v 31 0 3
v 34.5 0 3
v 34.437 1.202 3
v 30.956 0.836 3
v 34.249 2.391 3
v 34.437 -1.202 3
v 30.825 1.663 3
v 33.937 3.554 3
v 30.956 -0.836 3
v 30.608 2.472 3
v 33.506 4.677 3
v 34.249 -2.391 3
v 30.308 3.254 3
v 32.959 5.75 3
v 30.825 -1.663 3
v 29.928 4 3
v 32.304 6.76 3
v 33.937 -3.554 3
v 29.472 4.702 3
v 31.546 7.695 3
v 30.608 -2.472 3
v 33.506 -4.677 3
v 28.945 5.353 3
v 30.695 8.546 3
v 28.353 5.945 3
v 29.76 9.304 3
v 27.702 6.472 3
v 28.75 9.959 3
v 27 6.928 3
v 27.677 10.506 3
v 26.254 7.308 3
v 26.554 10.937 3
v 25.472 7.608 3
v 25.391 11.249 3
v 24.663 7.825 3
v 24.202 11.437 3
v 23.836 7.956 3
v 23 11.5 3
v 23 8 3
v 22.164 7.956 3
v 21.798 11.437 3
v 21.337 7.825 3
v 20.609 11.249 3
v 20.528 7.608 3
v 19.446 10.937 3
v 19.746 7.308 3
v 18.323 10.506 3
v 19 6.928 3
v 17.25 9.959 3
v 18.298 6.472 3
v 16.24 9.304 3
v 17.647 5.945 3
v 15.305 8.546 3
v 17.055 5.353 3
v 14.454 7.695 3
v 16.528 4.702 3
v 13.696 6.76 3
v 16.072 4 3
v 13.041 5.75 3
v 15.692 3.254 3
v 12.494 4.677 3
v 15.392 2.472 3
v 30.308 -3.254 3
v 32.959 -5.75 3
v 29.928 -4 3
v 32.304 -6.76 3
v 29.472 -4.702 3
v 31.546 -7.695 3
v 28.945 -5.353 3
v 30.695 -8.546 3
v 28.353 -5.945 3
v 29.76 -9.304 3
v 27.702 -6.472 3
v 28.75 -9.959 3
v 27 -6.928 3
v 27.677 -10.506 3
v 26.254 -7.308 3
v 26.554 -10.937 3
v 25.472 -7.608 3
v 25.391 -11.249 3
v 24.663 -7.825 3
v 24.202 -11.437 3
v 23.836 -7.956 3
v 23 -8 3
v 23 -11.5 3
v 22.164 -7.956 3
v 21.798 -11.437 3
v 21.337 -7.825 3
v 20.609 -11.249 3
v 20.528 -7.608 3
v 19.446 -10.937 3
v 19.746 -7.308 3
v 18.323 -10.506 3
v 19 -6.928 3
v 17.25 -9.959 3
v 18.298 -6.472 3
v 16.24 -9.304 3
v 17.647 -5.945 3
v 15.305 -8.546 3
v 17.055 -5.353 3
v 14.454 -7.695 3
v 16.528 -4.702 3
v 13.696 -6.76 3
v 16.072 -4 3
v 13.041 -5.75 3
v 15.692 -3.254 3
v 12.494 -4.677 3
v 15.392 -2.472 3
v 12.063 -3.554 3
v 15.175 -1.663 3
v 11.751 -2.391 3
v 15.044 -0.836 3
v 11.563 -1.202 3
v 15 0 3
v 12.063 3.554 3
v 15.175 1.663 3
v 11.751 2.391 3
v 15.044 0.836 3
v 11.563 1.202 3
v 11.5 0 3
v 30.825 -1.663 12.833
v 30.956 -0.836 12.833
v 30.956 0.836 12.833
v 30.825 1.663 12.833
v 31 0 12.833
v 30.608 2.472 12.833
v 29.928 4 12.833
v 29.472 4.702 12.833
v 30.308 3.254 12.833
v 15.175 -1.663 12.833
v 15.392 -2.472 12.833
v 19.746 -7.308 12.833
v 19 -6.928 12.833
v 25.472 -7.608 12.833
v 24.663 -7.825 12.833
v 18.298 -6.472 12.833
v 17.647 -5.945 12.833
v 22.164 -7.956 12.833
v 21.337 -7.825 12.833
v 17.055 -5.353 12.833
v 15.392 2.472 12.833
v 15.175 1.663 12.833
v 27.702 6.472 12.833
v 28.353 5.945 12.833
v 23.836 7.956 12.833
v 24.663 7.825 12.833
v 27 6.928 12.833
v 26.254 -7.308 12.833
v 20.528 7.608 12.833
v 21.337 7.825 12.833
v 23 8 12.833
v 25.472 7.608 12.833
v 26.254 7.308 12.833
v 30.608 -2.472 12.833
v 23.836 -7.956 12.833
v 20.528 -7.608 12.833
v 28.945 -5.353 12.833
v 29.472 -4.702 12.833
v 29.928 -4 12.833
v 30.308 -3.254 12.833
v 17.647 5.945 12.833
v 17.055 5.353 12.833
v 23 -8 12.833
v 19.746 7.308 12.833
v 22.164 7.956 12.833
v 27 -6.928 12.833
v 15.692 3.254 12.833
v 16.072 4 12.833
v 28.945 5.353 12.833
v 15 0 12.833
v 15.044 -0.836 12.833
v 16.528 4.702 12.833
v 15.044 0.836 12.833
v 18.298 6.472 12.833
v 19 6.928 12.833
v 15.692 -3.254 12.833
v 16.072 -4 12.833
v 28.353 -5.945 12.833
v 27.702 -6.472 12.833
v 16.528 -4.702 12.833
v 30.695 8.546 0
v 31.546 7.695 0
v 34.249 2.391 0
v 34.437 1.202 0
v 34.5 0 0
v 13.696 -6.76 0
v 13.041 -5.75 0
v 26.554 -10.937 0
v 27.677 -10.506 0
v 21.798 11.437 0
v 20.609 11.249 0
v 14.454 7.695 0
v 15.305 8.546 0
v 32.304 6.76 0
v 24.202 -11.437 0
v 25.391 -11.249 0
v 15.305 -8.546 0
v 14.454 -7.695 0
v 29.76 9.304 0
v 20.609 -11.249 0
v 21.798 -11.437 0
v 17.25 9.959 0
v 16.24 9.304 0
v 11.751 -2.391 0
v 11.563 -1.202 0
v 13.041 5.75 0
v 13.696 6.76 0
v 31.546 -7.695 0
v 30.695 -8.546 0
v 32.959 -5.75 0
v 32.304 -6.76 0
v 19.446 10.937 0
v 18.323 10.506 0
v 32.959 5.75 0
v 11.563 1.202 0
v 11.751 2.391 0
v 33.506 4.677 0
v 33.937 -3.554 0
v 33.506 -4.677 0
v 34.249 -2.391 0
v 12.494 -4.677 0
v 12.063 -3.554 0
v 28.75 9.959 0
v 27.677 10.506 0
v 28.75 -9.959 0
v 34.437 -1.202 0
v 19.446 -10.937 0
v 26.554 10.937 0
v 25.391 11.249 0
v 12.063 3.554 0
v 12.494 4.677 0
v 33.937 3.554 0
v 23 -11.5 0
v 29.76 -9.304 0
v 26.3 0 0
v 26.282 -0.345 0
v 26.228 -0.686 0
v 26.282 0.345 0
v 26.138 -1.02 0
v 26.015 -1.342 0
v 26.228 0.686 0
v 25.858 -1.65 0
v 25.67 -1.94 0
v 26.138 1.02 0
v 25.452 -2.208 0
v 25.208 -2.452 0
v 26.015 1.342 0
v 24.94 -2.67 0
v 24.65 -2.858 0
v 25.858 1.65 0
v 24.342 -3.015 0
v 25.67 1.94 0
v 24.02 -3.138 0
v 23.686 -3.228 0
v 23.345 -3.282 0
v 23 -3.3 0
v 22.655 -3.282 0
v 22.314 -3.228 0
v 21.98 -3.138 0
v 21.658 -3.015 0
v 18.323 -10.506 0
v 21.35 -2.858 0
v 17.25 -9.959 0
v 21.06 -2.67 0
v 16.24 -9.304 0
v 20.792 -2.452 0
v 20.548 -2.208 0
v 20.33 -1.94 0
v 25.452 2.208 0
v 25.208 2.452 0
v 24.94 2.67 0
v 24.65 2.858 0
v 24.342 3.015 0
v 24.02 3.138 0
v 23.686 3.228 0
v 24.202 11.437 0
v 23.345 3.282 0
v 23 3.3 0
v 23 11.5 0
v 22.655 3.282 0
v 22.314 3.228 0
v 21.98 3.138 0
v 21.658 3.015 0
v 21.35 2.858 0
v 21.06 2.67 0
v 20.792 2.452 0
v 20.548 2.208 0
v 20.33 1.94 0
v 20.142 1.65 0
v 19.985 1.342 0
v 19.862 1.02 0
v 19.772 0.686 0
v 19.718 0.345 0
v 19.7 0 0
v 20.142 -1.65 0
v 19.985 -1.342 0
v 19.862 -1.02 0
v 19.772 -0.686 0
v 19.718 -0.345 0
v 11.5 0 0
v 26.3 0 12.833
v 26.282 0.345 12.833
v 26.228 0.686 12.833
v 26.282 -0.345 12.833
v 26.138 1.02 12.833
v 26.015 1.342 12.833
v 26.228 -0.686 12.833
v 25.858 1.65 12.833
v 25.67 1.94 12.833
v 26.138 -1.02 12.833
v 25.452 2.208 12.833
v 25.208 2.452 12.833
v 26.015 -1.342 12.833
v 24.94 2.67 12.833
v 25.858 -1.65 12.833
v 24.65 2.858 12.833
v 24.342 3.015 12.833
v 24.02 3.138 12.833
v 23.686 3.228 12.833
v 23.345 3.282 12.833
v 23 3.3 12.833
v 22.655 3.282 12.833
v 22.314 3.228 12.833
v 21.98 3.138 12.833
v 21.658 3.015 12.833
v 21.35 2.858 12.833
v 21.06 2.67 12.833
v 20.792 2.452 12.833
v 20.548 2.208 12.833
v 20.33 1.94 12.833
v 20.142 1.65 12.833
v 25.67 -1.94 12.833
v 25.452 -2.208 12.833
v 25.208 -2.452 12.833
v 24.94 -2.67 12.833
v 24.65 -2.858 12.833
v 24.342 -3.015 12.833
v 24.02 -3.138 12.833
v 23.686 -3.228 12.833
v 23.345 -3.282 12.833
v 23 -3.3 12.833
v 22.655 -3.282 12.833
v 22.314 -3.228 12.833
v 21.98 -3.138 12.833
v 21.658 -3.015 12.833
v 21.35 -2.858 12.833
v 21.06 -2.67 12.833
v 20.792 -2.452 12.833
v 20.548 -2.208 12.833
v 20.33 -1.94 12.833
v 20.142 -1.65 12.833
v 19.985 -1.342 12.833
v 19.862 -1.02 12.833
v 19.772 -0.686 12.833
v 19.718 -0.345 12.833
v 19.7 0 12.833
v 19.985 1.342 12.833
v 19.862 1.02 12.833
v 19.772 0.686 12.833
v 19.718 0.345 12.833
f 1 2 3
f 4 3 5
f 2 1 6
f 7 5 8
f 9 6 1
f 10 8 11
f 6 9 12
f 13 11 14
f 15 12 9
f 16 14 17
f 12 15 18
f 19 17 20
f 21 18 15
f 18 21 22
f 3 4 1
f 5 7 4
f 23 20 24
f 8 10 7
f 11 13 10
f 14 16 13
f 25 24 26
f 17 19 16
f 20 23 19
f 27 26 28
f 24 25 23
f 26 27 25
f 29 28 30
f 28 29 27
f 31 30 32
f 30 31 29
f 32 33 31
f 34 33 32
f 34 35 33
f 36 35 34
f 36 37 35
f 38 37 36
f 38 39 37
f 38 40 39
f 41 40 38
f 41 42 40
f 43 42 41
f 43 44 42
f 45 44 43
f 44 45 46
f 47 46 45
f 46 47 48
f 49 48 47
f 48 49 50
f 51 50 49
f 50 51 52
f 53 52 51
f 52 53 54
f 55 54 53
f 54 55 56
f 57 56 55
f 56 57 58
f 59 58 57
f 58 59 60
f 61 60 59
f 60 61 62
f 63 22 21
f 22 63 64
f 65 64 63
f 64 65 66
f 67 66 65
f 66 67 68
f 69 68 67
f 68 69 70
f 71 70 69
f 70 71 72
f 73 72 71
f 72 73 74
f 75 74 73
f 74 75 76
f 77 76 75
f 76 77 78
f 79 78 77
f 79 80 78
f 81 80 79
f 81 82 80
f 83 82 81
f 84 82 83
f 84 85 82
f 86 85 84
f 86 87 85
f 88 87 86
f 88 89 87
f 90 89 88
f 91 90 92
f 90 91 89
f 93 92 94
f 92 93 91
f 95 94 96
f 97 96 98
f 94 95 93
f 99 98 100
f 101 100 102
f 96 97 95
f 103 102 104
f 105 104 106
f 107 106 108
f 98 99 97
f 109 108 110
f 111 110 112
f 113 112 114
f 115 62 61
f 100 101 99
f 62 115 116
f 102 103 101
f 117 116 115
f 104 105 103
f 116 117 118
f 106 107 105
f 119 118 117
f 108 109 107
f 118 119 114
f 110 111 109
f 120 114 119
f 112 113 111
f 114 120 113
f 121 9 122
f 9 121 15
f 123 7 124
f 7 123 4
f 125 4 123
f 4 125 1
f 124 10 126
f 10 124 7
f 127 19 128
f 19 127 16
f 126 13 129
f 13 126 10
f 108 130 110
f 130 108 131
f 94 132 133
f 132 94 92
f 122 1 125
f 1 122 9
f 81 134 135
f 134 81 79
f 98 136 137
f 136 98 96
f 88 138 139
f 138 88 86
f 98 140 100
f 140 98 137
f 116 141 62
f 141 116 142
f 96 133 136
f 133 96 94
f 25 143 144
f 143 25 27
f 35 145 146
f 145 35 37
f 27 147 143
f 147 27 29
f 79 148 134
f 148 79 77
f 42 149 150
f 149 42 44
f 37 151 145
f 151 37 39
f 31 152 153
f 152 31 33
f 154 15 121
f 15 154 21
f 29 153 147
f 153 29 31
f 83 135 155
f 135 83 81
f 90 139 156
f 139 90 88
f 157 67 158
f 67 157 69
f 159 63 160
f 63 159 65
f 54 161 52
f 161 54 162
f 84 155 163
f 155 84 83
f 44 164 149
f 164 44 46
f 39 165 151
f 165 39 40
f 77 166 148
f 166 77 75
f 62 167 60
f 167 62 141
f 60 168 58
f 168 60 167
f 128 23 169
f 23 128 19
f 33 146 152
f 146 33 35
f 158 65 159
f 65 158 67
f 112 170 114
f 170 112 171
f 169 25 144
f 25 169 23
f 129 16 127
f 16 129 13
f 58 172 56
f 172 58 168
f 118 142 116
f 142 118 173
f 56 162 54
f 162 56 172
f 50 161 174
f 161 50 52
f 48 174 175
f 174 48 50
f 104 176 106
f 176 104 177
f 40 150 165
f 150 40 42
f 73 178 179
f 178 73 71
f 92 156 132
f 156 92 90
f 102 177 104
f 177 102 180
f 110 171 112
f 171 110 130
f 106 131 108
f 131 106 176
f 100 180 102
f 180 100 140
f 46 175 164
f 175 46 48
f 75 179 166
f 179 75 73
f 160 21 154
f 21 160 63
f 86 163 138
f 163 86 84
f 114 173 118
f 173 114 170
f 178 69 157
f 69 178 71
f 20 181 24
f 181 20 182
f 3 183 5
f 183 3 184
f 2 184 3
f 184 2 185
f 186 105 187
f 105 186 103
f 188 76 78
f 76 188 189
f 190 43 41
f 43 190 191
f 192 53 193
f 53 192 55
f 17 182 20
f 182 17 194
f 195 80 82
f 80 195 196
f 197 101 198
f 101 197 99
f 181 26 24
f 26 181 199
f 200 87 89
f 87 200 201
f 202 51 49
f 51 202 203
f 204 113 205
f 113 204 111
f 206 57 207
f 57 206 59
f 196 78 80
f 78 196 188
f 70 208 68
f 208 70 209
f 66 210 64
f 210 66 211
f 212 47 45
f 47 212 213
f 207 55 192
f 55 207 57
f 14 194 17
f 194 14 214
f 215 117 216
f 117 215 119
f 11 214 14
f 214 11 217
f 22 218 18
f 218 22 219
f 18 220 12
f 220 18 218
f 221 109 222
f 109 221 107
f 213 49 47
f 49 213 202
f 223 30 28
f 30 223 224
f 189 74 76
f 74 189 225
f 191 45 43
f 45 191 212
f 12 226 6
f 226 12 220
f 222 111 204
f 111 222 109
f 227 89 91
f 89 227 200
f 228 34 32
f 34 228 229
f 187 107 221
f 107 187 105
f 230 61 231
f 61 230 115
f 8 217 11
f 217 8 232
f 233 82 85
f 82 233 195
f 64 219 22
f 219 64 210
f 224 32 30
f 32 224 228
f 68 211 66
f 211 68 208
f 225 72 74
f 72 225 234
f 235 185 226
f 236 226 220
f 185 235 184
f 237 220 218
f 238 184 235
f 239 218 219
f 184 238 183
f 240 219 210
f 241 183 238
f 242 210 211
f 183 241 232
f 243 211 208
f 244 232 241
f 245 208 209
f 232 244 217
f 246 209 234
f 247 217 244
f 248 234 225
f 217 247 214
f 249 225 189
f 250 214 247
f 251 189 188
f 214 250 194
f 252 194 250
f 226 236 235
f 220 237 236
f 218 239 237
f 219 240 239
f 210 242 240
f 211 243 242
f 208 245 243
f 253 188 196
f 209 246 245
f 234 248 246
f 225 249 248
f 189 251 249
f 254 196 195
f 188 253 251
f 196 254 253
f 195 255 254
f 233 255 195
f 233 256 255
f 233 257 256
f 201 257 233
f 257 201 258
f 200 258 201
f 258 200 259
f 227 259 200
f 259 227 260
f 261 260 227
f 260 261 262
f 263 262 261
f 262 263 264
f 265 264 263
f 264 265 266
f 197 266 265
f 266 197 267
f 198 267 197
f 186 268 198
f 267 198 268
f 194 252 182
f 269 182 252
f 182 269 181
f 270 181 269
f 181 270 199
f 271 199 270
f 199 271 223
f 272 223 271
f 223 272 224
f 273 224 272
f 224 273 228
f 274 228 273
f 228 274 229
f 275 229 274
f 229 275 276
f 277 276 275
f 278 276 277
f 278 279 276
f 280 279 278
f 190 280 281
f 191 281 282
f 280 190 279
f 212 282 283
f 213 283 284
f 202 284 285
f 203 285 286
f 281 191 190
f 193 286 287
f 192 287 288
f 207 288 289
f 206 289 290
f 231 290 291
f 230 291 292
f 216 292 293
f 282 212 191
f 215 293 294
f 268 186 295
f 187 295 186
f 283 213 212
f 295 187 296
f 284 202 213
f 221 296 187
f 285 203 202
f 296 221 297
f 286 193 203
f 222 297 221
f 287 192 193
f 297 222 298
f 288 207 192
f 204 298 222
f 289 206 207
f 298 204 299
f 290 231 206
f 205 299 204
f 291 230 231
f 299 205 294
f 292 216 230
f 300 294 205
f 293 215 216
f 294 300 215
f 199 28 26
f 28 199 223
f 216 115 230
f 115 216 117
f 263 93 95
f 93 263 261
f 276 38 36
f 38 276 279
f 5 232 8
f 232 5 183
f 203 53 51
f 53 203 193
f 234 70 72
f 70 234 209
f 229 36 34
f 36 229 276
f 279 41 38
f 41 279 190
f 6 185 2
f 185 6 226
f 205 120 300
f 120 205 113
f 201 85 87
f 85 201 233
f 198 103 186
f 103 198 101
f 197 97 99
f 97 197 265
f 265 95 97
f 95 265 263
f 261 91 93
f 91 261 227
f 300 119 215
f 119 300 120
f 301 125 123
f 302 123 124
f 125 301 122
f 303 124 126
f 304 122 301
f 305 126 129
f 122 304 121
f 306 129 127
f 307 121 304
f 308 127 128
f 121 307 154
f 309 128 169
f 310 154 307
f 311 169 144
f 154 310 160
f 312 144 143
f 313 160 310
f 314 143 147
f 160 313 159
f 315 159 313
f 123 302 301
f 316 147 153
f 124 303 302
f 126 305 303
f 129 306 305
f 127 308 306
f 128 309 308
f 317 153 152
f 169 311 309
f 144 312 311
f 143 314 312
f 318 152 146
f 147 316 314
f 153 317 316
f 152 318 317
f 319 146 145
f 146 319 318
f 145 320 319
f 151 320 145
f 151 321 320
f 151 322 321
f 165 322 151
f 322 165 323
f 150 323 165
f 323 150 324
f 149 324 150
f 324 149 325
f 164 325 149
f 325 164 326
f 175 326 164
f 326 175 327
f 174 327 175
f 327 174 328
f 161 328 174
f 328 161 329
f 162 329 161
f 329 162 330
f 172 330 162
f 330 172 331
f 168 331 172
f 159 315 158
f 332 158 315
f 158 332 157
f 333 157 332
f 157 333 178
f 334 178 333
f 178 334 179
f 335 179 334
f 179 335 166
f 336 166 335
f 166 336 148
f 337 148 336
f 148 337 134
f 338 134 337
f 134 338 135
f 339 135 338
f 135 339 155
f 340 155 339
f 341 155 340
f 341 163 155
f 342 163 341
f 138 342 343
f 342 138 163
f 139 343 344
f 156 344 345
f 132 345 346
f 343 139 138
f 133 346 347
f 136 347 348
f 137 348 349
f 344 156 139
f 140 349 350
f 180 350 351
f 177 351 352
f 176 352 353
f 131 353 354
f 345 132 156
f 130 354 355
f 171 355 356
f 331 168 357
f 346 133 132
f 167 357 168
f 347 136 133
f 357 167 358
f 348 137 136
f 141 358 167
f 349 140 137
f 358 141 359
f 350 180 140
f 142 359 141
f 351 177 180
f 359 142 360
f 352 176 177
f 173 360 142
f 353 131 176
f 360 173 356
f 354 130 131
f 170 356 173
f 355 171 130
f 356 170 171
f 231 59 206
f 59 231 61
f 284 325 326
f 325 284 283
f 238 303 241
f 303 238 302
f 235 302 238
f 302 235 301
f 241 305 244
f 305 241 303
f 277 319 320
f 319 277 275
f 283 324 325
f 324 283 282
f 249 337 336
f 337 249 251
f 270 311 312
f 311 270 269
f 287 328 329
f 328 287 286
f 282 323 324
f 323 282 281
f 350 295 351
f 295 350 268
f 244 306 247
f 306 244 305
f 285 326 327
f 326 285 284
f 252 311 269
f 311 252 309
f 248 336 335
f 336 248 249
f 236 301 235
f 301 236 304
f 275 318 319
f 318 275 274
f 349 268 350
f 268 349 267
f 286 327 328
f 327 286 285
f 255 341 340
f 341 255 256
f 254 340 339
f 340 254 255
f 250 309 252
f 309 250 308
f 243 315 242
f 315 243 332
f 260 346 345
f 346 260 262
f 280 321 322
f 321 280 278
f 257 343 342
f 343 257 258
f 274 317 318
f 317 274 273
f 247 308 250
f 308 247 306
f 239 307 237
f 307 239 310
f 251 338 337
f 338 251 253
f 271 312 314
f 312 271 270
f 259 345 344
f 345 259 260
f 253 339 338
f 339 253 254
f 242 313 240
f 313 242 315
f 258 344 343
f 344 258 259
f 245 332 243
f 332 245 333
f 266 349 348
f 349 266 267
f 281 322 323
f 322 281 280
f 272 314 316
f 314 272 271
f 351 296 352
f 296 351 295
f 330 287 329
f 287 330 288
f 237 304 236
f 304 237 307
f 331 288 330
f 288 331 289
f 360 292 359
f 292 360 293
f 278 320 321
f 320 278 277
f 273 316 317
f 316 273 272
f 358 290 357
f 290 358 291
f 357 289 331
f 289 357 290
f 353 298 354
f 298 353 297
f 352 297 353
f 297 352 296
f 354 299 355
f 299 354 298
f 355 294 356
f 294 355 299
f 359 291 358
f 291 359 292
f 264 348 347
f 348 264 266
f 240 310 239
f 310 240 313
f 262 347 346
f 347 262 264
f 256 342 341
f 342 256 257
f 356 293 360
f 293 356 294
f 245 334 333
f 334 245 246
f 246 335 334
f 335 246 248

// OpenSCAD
// file: flange_with_recess.scad
$fn = 60;

module flange(r_flange, t_flange, r_shaft, d_shaft, r_hole = 0, r_recess = 0, d_recess = 0, fn_recess = $fn) {
  difference() {

    // outer flange/cylinder
    cylinder(h = d_shaft+t_flange, r = r_flange);

    // bolt hole
    translate([0, 0, -t_flange]) cylinder(h = 2*d_shaft+t_flange, r = r_hole);

    // donut cutter
    translate([0, 0, t_flange]) {
      difference() {
        cylinder(h = d_shaft+t_flange, r = 2*r_flange);
        cylinder(h = 2*d_shaft+t_flange, r = r_shaft);
      }
    }

    // recess
    translate([0, 0, -d_recess]) cylinder(h = 2*d_recess, r = r_recess, $fn = fn_recess);
  }
}
// main file
$fn = 60;

include <flange_with_recess.scad>

id = 16/2;
od = 23;
h = 29.5/3;
t = 3;
d_bolt = 6.6;
r_bolt_head = 13.4/2;
t_bolt_head = 5;

// r_flange, t_flange, r_shaft, d_shaft, r_hole = 0, r_recess = 0, d_recess = 0, fn_recess = $fn
// flange(od/2, t, id, h, d_bolt/2, r_bolt_head, t_bolt_head, 6);
translate([od, 0, 0]) flange(od/2, t, id, h, d_bolt/2);
